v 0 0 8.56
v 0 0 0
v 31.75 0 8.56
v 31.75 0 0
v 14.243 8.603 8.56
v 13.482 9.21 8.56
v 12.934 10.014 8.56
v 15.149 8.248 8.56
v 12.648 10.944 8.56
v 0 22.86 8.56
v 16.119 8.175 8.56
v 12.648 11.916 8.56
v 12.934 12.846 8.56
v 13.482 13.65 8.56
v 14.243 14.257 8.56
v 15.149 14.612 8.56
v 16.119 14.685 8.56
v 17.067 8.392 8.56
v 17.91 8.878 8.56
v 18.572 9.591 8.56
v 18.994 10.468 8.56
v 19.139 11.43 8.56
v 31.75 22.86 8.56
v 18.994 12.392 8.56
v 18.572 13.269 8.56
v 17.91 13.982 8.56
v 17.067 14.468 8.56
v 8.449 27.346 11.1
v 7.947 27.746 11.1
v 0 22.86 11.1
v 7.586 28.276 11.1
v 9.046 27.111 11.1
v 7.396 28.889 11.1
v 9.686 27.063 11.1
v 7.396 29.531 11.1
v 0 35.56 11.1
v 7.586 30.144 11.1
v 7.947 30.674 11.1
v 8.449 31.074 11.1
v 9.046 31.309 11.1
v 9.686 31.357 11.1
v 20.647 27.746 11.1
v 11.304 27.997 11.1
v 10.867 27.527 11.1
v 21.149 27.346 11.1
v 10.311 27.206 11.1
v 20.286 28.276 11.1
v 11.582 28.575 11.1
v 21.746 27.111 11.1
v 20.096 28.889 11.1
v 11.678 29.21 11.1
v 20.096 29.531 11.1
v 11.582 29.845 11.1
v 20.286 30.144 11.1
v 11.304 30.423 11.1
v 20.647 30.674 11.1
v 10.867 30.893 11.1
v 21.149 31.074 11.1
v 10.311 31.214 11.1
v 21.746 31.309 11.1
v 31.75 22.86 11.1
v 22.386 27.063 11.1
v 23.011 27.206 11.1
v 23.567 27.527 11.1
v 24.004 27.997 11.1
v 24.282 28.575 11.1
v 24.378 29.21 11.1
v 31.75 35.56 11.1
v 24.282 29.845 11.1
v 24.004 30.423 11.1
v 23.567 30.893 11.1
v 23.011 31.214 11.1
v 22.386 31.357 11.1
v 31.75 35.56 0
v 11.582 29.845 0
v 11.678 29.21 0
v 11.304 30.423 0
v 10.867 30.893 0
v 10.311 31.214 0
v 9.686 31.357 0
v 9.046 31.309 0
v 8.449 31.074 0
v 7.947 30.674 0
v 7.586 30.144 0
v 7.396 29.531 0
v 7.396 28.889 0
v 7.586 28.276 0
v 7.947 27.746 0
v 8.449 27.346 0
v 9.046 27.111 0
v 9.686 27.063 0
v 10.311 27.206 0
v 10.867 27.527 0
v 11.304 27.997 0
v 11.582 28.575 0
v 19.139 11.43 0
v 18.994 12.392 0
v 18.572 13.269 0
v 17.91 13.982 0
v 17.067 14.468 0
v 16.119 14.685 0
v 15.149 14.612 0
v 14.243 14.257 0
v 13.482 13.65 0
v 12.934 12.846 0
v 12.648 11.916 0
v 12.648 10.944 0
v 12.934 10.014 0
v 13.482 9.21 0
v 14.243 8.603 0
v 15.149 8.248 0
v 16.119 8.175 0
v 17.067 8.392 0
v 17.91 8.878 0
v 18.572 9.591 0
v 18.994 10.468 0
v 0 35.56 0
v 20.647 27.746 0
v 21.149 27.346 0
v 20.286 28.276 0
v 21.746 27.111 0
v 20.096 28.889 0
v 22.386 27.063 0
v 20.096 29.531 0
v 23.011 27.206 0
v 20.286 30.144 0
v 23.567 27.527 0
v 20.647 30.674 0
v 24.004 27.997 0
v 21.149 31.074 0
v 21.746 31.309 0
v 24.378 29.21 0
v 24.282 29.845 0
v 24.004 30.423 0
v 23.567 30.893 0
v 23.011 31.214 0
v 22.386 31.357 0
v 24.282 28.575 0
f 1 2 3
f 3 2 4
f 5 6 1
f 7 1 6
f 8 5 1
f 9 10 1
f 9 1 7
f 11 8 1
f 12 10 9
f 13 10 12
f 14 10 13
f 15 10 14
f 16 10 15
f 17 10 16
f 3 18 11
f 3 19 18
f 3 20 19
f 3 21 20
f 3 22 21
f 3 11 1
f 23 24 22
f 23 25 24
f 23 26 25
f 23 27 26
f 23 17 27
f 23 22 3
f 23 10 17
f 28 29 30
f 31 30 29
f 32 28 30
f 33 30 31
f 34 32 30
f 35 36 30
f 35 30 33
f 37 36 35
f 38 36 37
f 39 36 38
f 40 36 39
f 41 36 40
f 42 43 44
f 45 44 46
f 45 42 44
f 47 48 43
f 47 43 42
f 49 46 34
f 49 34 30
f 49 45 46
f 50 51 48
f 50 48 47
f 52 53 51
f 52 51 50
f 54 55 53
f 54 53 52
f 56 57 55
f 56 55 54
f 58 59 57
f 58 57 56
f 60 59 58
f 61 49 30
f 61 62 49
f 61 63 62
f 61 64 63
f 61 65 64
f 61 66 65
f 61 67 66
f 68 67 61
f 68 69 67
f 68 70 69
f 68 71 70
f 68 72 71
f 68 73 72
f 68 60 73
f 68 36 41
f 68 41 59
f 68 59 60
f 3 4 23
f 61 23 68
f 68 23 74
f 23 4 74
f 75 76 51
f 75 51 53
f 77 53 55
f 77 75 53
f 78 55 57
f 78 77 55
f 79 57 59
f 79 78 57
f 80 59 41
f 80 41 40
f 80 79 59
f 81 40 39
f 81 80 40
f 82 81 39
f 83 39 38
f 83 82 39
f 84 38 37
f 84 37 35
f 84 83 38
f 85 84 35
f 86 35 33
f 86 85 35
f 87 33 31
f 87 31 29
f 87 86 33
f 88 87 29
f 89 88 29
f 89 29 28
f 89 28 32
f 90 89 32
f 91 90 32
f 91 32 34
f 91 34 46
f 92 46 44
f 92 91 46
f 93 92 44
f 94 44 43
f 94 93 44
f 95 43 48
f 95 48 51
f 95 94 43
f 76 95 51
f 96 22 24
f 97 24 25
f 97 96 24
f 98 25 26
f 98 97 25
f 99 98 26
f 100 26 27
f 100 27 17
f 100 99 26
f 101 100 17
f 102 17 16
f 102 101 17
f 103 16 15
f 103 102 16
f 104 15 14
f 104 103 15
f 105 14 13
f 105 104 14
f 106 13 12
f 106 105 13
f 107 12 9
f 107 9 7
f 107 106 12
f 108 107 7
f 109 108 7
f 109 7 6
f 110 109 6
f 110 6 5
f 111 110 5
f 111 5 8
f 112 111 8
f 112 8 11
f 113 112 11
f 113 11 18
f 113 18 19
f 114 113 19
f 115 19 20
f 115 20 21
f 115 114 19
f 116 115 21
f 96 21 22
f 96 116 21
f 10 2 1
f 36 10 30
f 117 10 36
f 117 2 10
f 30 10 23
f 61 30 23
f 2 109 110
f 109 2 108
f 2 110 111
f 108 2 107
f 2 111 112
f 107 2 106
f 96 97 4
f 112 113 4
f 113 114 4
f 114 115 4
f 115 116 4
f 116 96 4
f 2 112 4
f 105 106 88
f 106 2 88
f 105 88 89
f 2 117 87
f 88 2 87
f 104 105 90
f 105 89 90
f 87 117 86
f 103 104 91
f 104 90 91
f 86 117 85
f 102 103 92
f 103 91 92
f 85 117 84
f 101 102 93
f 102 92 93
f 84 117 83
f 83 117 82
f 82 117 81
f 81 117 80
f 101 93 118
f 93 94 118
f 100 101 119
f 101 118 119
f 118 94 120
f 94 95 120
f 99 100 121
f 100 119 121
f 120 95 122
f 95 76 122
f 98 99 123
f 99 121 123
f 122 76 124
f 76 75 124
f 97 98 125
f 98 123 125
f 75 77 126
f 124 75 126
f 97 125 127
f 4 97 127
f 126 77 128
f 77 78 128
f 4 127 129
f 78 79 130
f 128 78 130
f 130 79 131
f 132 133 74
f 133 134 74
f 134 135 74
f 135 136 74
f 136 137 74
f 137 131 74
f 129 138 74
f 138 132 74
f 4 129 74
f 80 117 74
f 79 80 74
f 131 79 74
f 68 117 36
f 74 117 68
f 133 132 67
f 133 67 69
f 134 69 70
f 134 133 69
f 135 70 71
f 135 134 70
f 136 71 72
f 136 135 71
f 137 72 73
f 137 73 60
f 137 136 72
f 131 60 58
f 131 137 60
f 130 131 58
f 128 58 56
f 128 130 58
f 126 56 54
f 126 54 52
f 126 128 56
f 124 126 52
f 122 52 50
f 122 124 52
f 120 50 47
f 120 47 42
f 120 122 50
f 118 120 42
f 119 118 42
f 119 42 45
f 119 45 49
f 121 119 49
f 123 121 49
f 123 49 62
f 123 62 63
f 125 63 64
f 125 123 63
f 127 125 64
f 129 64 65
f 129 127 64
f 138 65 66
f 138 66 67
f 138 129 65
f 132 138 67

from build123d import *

# Parameters (mm, degrees)
SKETCH1_W           = 31.75
SKETCH1_H           = 12.7
SKETCH1_R           = 2.15265
BOSS_EXTRUDE1_DEPTH = 11.0998
SKETCH1_6_W         = 31.75
SKETCH1_6_H         = 22.86
SKETCH1_6_R         = 3.2639
BOSS_EXTRUDE2_DEPTH = 8.5598


with BuildPart() as part:
    # Sketch1 → Boss-Extrude1 (new body)
    with BuildSketch(Plane.XY):
        with Locations((15.875, 29.21)):
            Rectangle(SKETCH1_W, SKETCH1_H)
        with Locations((9.525, 29.21)):
            Circle(SKETCH1_R, mode=Mode.SUBTRACT)
        with Locations((22.225, 29.21)):
            Circle(SKETCH1_R, mode=Mode.SUBTRACT)
    extrude(amount=BOSS_EXTRUDE1_DEPTH)

    # Sketch1<6> → Boss-Extrude2 (add)
    with BuildSketch(Plane.XY):
        with Locations((15.875, 11.43)):
            Rectangle(SKETCH1_6_W, SKETCH1_6_H)
        with Locations((15.875, 11.43)):
            Circle(SKETCH1_6_R, mode=Mode.SUBTRACT)
    extrude(amount=BOSS_EXTRUDE2_DEPTH)


solid = part.part
